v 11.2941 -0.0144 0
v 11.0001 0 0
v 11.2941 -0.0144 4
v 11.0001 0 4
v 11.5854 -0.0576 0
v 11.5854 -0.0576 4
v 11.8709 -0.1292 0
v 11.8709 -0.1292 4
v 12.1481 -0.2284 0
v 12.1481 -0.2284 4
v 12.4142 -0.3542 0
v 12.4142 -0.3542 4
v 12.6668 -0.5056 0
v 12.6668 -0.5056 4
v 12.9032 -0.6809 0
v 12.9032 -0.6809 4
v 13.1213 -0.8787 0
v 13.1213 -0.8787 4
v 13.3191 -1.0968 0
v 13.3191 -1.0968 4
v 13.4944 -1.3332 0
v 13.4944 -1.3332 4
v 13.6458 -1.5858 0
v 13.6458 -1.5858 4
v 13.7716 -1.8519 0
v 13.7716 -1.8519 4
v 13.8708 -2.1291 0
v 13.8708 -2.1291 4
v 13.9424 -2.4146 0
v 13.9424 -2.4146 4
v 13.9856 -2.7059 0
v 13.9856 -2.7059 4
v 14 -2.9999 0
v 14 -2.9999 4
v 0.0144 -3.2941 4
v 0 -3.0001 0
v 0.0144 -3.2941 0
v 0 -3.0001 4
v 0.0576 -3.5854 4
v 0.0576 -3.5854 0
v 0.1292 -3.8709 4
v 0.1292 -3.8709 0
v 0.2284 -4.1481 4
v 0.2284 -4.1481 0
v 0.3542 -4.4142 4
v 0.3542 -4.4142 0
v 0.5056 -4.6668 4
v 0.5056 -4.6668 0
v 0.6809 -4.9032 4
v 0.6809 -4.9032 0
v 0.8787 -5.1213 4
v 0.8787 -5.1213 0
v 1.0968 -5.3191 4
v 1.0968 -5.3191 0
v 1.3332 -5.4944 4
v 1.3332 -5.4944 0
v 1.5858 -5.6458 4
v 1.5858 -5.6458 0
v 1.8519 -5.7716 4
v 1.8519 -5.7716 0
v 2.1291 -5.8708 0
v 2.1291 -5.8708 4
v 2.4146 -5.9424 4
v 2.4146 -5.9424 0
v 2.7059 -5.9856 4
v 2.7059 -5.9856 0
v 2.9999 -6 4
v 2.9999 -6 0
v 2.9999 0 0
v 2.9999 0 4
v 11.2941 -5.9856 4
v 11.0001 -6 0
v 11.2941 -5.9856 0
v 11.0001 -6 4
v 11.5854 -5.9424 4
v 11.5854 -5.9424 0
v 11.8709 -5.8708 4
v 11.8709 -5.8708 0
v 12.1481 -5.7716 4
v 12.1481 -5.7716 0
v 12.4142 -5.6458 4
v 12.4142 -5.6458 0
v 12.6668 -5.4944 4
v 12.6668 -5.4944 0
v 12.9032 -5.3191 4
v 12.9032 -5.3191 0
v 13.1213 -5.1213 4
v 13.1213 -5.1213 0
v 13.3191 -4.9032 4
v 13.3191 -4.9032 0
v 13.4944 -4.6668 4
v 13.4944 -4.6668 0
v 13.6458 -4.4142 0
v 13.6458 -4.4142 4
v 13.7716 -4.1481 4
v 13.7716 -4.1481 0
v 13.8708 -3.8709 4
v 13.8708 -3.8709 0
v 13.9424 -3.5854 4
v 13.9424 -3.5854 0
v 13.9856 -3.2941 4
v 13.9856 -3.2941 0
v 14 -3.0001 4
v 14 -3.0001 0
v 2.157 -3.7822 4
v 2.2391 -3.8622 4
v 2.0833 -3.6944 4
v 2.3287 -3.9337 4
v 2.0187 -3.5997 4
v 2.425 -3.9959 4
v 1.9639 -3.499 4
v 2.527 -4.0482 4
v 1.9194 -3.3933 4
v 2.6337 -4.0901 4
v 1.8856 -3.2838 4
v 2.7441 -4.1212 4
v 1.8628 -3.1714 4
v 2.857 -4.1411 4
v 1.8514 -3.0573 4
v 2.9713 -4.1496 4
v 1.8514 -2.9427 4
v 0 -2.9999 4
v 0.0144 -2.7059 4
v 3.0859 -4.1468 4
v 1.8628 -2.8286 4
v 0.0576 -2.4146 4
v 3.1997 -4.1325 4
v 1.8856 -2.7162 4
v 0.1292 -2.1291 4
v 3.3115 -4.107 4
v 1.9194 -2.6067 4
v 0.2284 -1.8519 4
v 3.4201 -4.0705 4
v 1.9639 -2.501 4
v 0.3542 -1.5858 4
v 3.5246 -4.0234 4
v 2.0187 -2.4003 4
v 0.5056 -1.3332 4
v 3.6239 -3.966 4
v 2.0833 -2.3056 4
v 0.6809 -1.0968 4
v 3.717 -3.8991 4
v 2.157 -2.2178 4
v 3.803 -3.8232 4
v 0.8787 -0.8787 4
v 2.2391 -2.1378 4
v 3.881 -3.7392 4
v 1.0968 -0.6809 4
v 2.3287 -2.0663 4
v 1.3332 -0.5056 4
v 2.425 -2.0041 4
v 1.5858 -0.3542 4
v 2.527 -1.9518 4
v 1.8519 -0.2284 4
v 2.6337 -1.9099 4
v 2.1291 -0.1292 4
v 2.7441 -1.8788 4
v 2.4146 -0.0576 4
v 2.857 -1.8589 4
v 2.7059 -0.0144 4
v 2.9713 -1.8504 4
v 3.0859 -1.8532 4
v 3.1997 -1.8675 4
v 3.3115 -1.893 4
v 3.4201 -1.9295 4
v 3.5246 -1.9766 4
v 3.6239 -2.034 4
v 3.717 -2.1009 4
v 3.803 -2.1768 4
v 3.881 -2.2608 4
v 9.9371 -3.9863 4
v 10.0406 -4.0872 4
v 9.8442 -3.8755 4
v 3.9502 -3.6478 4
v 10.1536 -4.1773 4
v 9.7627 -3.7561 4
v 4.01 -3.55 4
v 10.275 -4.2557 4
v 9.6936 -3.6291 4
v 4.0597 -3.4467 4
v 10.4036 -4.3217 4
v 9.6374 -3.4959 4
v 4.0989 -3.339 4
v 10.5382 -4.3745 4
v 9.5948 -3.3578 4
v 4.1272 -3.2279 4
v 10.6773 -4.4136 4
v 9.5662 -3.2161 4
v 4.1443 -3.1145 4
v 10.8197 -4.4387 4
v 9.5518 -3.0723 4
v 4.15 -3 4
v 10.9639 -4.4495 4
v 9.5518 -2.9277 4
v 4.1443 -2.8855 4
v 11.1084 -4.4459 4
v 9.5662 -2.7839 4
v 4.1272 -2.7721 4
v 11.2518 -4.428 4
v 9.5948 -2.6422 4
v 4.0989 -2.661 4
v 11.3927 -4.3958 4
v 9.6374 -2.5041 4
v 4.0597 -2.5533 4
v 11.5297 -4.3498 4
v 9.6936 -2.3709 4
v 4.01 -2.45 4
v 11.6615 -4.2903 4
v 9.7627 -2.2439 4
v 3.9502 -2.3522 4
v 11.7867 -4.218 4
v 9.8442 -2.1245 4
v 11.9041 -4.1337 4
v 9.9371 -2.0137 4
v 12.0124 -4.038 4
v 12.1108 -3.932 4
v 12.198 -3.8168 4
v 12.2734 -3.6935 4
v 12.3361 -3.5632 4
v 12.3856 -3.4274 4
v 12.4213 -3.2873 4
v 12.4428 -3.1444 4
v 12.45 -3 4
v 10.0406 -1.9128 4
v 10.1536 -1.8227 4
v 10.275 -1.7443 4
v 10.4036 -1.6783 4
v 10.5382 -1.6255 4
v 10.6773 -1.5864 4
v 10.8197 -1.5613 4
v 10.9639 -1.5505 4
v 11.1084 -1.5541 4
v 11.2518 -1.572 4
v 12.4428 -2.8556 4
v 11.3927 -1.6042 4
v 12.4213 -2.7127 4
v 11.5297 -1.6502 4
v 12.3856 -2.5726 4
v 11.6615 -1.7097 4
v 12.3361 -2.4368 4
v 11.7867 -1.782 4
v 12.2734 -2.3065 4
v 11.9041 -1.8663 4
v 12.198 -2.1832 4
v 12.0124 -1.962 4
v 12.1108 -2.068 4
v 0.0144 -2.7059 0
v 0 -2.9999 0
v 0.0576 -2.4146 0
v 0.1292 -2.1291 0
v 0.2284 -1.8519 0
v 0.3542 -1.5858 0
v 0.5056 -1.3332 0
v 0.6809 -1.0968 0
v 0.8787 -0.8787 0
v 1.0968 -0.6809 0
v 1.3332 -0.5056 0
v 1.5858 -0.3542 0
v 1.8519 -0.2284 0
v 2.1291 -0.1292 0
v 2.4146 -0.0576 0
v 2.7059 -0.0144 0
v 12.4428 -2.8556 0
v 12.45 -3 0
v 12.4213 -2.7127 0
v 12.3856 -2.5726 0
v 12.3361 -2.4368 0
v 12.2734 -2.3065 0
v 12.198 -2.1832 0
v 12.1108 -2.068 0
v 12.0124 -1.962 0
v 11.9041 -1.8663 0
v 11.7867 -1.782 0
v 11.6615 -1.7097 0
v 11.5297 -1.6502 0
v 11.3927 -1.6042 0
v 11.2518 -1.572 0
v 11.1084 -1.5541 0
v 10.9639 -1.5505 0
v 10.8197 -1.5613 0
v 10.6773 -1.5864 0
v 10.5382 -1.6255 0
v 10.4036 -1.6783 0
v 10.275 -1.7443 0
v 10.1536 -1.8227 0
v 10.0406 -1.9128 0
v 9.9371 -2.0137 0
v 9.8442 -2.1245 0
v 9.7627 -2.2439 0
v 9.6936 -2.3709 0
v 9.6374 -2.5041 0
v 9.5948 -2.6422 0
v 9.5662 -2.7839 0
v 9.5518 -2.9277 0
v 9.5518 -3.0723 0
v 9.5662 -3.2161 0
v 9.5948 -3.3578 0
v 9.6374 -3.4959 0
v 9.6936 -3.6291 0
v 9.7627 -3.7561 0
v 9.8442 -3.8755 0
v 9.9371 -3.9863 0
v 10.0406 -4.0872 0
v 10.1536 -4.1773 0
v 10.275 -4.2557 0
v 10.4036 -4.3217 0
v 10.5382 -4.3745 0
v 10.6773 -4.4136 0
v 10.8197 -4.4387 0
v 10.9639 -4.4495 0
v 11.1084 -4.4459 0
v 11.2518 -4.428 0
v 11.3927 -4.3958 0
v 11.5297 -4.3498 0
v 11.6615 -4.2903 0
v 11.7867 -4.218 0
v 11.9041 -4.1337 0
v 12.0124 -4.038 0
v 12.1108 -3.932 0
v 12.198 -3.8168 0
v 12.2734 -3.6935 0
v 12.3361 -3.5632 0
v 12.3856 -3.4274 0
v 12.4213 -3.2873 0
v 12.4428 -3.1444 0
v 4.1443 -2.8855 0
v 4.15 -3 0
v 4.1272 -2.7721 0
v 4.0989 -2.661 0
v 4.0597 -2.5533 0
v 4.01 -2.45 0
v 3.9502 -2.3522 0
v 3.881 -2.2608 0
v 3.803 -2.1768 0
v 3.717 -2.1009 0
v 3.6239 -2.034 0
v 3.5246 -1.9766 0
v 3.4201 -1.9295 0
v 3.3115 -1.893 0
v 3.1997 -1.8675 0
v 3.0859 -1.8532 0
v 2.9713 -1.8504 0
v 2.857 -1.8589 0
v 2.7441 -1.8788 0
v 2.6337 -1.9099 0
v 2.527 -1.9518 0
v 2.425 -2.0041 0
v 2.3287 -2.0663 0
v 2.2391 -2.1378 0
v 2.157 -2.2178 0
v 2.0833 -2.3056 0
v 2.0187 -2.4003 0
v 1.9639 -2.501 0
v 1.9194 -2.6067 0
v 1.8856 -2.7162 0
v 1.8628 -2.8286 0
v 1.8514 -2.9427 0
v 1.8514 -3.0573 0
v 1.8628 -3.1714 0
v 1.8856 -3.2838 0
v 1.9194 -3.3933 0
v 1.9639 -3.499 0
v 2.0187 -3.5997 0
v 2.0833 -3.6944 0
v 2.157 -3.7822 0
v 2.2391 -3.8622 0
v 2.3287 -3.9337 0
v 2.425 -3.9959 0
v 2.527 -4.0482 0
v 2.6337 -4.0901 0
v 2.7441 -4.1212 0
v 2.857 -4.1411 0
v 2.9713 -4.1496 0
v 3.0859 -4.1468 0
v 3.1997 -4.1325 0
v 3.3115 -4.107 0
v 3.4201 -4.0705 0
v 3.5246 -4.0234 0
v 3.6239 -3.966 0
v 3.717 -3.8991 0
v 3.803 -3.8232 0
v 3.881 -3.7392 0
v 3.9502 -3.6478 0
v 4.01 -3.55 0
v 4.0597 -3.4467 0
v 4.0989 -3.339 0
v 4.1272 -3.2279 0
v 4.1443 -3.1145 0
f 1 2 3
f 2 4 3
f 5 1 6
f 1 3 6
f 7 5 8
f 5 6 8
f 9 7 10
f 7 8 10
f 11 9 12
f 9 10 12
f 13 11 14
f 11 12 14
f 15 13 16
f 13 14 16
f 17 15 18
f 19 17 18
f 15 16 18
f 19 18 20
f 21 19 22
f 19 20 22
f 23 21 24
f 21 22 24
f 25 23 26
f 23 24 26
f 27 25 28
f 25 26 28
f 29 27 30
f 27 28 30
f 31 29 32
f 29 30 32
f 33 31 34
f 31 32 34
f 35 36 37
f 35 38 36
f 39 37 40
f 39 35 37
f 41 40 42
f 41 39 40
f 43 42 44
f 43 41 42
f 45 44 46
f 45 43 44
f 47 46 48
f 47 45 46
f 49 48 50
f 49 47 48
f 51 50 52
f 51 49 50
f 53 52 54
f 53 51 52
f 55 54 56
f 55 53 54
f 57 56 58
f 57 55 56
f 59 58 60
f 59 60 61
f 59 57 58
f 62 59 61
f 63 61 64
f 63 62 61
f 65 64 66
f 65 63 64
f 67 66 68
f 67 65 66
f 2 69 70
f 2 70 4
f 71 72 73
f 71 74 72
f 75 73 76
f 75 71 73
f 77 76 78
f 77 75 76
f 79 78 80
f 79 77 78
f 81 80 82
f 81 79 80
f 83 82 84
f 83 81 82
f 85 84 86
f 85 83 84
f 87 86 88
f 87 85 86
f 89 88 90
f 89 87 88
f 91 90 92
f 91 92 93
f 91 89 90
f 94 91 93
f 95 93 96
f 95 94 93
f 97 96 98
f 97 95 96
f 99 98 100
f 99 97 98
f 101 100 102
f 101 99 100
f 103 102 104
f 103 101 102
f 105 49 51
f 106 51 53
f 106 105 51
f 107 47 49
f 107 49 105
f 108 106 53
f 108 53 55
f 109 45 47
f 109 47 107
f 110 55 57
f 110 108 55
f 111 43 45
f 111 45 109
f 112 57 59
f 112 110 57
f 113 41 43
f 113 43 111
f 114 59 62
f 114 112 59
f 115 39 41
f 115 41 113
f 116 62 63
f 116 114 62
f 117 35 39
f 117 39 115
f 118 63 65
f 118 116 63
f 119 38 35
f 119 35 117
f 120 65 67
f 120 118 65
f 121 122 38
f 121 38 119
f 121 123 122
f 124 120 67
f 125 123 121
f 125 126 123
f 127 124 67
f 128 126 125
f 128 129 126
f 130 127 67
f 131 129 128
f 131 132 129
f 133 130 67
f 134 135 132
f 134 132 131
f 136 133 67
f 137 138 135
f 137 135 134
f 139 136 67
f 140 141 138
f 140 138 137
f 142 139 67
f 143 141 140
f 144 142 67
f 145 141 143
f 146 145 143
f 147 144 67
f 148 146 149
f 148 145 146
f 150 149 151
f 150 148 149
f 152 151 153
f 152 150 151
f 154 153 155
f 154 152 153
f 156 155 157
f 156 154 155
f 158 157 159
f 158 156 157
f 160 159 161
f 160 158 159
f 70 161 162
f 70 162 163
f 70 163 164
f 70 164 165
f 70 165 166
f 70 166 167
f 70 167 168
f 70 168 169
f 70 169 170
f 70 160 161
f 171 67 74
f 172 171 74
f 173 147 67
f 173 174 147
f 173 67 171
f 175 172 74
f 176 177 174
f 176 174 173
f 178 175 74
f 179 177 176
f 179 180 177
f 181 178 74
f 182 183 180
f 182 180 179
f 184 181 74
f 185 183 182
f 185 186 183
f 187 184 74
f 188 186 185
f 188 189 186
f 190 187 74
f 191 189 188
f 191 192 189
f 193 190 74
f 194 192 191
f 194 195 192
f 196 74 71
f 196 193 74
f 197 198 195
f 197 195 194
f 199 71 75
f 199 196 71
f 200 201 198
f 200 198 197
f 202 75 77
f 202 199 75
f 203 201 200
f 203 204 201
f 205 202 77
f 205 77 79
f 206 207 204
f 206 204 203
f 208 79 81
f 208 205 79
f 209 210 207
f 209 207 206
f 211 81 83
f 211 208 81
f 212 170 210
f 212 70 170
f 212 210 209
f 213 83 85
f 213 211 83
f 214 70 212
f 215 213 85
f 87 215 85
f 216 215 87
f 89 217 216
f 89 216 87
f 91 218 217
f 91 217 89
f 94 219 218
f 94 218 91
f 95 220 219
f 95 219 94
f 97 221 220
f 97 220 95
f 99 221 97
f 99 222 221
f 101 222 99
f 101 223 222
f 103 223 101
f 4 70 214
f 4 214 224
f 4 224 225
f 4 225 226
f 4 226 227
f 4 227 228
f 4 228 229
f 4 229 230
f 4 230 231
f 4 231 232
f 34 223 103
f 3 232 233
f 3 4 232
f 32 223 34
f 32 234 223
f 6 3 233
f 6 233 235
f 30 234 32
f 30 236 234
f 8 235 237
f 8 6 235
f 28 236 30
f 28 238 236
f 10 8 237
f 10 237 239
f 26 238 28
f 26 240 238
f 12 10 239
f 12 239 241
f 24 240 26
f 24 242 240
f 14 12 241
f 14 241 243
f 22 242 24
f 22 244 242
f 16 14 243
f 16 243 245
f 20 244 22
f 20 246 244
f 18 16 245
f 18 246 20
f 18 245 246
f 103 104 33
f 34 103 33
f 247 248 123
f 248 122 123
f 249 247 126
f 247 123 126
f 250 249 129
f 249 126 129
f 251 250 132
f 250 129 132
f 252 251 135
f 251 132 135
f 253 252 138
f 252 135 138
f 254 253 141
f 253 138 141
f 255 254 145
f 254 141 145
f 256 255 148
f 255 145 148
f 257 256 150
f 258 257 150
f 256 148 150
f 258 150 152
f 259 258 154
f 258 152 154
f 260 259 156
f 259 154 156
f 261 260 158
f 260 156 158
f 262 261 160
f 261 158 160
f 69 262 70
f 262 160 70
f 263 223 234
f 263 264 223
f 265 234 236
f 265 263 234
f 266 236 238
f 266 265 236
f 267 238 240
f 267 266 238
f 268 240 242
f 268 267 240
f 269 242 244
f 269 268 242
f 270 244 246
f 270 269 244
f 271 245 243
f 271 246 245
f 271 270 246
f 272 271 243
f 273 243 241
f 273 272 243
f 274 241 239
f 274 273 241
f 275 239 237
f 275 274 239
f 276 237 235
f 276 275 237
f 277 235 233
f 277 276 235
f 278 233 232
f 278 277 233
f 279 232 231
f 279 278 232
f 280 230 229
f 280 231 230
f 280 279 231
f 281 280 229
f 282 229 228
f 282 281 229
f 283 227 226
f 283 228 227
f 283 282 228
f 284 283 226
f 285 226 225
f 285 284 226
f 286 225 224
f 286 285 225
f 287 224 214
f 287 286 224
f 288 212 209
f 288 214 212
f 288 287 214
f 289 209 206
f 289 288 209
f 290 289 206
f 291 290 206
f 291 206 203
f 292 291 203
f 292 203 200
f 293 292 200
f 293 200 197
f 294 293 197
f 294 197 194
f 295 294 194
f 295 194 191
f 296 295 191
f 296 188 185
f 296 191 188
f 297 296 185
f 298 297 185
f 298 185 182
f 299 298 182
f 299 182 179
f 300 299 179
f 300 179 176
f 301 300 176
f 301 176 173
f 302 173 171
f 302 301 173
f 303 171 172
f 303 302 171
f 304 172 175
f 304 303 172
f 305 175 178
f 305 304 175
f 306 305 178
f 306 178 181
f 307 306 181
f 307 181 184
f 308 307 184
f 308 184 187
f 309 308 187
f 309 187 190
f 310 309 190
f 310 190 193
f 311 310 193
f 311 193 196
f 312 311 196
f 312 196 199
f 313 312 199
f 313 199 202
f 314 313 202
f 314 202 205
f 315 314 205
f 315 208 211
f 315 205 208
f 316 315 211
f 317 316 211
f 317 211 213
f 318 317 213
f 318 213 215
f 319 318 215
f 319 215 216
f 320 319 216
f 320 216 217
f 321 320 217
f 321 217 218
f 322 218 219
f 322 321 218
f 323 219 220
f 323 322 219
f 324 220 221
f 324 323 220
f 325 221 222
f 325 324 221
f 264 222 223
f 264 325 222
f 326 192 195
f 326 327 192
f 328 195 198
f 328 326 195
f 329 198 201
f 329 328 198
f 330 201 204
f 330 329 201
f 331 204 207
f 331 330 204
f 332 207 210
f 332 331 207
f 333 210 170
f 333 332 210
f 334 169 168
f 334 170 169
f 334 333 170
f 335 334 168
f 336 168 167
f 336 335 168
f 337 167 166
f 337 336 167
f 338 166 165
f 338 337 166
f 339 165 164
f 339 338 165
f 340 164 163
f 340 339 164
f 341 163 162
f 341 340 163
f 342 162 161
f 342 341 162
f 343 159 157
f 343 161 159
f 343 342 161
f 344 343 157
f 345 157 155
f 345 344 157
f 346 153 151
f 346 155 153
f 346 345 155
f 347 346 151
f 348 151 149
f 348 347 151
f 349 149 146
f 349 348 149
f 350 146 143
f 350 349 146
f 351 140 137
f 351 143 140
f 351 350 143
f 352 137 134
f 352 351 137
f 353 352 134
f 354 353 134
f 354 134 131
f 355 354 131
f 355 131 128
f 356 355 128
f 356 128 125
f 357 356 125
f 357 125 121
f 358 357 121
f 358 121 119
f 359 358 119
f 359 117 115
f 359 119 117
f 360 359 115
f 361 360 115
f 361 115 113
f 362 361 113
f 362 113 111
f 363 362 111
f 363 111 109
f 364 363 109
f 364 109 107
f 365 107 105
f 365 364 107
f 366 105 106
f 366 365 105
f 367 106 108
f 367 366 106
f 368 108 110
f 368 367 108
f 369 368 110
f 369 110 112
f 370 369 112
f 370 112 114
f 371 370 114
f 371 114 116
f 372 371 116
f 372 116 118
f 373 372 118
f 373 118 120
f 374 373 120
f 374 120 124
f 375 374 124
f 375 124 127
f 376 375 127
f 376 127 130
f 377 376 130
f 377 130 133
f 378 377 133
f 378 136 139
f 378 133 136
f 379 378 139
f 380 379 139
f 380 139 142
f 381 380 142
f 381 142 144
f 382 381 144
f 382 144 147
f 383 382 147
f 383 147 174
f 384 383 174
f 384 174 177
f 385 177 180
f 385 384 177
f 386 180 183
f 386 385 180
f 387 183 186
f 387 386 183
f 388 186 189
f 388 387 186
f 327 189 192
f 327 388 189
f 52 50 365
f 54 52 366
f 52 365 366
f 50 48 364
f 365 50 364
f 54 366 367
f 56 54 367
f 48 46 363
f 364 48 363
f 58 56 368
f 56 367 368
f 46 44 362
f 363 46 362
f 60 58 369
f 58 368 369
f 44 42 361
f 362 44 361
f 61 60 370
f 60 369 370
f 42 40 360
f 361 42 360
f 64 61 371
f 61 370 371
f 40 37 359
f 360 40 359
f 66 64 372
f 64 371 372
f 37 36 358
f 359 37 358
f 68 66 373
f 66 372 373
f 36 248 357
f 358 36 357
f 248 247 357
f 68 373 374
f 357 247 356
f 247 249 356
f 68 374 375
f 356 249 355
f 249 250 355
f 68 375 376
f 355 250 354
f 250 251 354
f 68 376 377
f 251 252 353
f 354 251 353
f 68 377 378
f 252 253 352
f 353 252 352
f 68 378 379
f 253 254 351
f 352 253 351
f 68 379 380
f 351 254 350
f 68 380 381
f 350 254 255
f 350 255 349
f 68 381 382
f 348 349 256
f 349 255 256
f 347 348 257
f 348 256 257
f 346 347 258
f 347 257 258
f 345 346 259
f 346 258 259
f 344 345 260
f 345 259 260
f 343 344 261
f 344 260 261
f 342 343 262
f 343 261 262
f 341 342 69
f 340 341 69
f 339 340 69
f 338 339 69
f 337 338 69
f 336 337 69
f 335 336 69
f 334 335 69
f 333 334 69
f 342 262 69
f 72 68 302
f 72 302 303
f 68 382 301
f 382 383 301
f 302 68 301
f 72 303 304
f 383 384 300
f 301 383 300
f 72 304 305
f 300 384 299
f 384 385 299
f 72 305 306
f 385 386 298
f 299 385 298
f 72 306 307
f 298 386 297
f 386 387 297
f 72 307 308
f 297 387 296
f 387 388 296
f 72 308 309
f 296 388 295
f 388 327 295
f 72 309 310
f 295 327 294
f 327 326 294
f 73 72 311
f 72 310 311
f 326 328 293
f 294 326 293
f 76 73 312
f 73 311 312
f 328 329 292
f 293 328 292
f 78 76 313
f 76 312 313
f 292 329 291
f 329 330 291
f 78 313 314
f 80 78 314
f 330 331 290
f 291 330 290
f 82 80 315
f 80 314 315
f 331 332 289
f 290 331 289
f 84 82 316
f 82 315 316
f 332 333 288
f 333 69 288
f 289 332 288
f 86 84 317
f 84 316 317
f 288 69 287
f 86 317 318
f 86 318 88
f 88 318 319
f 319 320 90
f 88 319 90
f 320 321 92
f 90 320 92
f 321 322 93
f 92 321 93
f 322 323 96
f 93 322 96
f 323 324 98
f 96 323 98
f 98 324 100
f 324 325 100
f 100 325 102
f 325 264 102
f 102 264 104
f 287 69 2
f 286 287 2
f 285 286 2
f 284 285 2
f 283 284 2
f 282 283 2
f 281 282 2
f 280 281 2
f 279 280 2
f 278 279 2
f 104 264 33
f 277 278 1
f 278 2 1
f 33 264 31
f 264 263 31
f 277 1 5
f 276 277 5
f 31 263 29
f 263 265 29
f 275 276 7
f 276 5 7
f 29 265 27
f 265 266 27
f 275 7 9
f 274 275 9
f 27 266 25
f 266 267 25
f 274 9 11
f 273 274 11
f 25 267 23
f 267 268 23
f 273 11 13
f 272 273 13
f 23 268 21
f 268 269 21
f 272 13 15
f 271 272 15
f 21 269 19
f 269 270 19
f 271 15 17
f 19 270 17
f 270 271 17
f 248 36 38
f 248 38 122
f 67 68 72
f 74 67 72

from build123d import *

# Parameters (mm, degrees)
SKETCH1_W               = 14
SKETCH1_H               = 6
BOSS_EXTRUDE1_DEPTH     = 4
CUT_EXTRUDE1_DEPTH      = 16.748015748
CUT_EXTRUDE1_DEPTH_BACK = 16.748015748
SKETCH2_R               = 1.15
SKETCH2_R_2             = 1.45
FILLET1_R               = 3


with BuildPart() as part:
    # Sketch1 → Boss-Extrude1 (new body)
    with BuildSketch(Plane.XY):
        with Locations((7, -3)):
            Rectangle(SKETCH1_W, SKETCH1_H)
    extrude(amount=BOSS_EXTRUDE1_DEPTH)

    # Sketch2 → Cut-Extrude1 (cut, two sides: drawn at the far end of the back side and taken through both)
    with BuildSketch(Plane.XY.offset(4).offset(-CUT_EXTRUDE1_DEPTH_BACK)):
        with Locations((3, -3)):
            Circle(SKETCH2_R)
        with Locations((11, -3)):
            Circle(SKETCH2_R_2)
    extrude(amount=CUT_EXTRUDE1_DEPTH + CUT_EXTRUDE1_DEPTH_BACK, mode=Mode.SUBTRACT)

    # Fillet1
    fillet1_edges = [part.edges().sort_by_distance(p)[0] for p in [
        (14, -6, 2),
        (14, 0, 2),
        (0, -6, 2),
        (0, 0, 2),
    ]]
    fillet(fillet1_edges, radius=FILLET1_R - 0.0001)  # a hair under: the kernel refuses the full size


solid = part.part
